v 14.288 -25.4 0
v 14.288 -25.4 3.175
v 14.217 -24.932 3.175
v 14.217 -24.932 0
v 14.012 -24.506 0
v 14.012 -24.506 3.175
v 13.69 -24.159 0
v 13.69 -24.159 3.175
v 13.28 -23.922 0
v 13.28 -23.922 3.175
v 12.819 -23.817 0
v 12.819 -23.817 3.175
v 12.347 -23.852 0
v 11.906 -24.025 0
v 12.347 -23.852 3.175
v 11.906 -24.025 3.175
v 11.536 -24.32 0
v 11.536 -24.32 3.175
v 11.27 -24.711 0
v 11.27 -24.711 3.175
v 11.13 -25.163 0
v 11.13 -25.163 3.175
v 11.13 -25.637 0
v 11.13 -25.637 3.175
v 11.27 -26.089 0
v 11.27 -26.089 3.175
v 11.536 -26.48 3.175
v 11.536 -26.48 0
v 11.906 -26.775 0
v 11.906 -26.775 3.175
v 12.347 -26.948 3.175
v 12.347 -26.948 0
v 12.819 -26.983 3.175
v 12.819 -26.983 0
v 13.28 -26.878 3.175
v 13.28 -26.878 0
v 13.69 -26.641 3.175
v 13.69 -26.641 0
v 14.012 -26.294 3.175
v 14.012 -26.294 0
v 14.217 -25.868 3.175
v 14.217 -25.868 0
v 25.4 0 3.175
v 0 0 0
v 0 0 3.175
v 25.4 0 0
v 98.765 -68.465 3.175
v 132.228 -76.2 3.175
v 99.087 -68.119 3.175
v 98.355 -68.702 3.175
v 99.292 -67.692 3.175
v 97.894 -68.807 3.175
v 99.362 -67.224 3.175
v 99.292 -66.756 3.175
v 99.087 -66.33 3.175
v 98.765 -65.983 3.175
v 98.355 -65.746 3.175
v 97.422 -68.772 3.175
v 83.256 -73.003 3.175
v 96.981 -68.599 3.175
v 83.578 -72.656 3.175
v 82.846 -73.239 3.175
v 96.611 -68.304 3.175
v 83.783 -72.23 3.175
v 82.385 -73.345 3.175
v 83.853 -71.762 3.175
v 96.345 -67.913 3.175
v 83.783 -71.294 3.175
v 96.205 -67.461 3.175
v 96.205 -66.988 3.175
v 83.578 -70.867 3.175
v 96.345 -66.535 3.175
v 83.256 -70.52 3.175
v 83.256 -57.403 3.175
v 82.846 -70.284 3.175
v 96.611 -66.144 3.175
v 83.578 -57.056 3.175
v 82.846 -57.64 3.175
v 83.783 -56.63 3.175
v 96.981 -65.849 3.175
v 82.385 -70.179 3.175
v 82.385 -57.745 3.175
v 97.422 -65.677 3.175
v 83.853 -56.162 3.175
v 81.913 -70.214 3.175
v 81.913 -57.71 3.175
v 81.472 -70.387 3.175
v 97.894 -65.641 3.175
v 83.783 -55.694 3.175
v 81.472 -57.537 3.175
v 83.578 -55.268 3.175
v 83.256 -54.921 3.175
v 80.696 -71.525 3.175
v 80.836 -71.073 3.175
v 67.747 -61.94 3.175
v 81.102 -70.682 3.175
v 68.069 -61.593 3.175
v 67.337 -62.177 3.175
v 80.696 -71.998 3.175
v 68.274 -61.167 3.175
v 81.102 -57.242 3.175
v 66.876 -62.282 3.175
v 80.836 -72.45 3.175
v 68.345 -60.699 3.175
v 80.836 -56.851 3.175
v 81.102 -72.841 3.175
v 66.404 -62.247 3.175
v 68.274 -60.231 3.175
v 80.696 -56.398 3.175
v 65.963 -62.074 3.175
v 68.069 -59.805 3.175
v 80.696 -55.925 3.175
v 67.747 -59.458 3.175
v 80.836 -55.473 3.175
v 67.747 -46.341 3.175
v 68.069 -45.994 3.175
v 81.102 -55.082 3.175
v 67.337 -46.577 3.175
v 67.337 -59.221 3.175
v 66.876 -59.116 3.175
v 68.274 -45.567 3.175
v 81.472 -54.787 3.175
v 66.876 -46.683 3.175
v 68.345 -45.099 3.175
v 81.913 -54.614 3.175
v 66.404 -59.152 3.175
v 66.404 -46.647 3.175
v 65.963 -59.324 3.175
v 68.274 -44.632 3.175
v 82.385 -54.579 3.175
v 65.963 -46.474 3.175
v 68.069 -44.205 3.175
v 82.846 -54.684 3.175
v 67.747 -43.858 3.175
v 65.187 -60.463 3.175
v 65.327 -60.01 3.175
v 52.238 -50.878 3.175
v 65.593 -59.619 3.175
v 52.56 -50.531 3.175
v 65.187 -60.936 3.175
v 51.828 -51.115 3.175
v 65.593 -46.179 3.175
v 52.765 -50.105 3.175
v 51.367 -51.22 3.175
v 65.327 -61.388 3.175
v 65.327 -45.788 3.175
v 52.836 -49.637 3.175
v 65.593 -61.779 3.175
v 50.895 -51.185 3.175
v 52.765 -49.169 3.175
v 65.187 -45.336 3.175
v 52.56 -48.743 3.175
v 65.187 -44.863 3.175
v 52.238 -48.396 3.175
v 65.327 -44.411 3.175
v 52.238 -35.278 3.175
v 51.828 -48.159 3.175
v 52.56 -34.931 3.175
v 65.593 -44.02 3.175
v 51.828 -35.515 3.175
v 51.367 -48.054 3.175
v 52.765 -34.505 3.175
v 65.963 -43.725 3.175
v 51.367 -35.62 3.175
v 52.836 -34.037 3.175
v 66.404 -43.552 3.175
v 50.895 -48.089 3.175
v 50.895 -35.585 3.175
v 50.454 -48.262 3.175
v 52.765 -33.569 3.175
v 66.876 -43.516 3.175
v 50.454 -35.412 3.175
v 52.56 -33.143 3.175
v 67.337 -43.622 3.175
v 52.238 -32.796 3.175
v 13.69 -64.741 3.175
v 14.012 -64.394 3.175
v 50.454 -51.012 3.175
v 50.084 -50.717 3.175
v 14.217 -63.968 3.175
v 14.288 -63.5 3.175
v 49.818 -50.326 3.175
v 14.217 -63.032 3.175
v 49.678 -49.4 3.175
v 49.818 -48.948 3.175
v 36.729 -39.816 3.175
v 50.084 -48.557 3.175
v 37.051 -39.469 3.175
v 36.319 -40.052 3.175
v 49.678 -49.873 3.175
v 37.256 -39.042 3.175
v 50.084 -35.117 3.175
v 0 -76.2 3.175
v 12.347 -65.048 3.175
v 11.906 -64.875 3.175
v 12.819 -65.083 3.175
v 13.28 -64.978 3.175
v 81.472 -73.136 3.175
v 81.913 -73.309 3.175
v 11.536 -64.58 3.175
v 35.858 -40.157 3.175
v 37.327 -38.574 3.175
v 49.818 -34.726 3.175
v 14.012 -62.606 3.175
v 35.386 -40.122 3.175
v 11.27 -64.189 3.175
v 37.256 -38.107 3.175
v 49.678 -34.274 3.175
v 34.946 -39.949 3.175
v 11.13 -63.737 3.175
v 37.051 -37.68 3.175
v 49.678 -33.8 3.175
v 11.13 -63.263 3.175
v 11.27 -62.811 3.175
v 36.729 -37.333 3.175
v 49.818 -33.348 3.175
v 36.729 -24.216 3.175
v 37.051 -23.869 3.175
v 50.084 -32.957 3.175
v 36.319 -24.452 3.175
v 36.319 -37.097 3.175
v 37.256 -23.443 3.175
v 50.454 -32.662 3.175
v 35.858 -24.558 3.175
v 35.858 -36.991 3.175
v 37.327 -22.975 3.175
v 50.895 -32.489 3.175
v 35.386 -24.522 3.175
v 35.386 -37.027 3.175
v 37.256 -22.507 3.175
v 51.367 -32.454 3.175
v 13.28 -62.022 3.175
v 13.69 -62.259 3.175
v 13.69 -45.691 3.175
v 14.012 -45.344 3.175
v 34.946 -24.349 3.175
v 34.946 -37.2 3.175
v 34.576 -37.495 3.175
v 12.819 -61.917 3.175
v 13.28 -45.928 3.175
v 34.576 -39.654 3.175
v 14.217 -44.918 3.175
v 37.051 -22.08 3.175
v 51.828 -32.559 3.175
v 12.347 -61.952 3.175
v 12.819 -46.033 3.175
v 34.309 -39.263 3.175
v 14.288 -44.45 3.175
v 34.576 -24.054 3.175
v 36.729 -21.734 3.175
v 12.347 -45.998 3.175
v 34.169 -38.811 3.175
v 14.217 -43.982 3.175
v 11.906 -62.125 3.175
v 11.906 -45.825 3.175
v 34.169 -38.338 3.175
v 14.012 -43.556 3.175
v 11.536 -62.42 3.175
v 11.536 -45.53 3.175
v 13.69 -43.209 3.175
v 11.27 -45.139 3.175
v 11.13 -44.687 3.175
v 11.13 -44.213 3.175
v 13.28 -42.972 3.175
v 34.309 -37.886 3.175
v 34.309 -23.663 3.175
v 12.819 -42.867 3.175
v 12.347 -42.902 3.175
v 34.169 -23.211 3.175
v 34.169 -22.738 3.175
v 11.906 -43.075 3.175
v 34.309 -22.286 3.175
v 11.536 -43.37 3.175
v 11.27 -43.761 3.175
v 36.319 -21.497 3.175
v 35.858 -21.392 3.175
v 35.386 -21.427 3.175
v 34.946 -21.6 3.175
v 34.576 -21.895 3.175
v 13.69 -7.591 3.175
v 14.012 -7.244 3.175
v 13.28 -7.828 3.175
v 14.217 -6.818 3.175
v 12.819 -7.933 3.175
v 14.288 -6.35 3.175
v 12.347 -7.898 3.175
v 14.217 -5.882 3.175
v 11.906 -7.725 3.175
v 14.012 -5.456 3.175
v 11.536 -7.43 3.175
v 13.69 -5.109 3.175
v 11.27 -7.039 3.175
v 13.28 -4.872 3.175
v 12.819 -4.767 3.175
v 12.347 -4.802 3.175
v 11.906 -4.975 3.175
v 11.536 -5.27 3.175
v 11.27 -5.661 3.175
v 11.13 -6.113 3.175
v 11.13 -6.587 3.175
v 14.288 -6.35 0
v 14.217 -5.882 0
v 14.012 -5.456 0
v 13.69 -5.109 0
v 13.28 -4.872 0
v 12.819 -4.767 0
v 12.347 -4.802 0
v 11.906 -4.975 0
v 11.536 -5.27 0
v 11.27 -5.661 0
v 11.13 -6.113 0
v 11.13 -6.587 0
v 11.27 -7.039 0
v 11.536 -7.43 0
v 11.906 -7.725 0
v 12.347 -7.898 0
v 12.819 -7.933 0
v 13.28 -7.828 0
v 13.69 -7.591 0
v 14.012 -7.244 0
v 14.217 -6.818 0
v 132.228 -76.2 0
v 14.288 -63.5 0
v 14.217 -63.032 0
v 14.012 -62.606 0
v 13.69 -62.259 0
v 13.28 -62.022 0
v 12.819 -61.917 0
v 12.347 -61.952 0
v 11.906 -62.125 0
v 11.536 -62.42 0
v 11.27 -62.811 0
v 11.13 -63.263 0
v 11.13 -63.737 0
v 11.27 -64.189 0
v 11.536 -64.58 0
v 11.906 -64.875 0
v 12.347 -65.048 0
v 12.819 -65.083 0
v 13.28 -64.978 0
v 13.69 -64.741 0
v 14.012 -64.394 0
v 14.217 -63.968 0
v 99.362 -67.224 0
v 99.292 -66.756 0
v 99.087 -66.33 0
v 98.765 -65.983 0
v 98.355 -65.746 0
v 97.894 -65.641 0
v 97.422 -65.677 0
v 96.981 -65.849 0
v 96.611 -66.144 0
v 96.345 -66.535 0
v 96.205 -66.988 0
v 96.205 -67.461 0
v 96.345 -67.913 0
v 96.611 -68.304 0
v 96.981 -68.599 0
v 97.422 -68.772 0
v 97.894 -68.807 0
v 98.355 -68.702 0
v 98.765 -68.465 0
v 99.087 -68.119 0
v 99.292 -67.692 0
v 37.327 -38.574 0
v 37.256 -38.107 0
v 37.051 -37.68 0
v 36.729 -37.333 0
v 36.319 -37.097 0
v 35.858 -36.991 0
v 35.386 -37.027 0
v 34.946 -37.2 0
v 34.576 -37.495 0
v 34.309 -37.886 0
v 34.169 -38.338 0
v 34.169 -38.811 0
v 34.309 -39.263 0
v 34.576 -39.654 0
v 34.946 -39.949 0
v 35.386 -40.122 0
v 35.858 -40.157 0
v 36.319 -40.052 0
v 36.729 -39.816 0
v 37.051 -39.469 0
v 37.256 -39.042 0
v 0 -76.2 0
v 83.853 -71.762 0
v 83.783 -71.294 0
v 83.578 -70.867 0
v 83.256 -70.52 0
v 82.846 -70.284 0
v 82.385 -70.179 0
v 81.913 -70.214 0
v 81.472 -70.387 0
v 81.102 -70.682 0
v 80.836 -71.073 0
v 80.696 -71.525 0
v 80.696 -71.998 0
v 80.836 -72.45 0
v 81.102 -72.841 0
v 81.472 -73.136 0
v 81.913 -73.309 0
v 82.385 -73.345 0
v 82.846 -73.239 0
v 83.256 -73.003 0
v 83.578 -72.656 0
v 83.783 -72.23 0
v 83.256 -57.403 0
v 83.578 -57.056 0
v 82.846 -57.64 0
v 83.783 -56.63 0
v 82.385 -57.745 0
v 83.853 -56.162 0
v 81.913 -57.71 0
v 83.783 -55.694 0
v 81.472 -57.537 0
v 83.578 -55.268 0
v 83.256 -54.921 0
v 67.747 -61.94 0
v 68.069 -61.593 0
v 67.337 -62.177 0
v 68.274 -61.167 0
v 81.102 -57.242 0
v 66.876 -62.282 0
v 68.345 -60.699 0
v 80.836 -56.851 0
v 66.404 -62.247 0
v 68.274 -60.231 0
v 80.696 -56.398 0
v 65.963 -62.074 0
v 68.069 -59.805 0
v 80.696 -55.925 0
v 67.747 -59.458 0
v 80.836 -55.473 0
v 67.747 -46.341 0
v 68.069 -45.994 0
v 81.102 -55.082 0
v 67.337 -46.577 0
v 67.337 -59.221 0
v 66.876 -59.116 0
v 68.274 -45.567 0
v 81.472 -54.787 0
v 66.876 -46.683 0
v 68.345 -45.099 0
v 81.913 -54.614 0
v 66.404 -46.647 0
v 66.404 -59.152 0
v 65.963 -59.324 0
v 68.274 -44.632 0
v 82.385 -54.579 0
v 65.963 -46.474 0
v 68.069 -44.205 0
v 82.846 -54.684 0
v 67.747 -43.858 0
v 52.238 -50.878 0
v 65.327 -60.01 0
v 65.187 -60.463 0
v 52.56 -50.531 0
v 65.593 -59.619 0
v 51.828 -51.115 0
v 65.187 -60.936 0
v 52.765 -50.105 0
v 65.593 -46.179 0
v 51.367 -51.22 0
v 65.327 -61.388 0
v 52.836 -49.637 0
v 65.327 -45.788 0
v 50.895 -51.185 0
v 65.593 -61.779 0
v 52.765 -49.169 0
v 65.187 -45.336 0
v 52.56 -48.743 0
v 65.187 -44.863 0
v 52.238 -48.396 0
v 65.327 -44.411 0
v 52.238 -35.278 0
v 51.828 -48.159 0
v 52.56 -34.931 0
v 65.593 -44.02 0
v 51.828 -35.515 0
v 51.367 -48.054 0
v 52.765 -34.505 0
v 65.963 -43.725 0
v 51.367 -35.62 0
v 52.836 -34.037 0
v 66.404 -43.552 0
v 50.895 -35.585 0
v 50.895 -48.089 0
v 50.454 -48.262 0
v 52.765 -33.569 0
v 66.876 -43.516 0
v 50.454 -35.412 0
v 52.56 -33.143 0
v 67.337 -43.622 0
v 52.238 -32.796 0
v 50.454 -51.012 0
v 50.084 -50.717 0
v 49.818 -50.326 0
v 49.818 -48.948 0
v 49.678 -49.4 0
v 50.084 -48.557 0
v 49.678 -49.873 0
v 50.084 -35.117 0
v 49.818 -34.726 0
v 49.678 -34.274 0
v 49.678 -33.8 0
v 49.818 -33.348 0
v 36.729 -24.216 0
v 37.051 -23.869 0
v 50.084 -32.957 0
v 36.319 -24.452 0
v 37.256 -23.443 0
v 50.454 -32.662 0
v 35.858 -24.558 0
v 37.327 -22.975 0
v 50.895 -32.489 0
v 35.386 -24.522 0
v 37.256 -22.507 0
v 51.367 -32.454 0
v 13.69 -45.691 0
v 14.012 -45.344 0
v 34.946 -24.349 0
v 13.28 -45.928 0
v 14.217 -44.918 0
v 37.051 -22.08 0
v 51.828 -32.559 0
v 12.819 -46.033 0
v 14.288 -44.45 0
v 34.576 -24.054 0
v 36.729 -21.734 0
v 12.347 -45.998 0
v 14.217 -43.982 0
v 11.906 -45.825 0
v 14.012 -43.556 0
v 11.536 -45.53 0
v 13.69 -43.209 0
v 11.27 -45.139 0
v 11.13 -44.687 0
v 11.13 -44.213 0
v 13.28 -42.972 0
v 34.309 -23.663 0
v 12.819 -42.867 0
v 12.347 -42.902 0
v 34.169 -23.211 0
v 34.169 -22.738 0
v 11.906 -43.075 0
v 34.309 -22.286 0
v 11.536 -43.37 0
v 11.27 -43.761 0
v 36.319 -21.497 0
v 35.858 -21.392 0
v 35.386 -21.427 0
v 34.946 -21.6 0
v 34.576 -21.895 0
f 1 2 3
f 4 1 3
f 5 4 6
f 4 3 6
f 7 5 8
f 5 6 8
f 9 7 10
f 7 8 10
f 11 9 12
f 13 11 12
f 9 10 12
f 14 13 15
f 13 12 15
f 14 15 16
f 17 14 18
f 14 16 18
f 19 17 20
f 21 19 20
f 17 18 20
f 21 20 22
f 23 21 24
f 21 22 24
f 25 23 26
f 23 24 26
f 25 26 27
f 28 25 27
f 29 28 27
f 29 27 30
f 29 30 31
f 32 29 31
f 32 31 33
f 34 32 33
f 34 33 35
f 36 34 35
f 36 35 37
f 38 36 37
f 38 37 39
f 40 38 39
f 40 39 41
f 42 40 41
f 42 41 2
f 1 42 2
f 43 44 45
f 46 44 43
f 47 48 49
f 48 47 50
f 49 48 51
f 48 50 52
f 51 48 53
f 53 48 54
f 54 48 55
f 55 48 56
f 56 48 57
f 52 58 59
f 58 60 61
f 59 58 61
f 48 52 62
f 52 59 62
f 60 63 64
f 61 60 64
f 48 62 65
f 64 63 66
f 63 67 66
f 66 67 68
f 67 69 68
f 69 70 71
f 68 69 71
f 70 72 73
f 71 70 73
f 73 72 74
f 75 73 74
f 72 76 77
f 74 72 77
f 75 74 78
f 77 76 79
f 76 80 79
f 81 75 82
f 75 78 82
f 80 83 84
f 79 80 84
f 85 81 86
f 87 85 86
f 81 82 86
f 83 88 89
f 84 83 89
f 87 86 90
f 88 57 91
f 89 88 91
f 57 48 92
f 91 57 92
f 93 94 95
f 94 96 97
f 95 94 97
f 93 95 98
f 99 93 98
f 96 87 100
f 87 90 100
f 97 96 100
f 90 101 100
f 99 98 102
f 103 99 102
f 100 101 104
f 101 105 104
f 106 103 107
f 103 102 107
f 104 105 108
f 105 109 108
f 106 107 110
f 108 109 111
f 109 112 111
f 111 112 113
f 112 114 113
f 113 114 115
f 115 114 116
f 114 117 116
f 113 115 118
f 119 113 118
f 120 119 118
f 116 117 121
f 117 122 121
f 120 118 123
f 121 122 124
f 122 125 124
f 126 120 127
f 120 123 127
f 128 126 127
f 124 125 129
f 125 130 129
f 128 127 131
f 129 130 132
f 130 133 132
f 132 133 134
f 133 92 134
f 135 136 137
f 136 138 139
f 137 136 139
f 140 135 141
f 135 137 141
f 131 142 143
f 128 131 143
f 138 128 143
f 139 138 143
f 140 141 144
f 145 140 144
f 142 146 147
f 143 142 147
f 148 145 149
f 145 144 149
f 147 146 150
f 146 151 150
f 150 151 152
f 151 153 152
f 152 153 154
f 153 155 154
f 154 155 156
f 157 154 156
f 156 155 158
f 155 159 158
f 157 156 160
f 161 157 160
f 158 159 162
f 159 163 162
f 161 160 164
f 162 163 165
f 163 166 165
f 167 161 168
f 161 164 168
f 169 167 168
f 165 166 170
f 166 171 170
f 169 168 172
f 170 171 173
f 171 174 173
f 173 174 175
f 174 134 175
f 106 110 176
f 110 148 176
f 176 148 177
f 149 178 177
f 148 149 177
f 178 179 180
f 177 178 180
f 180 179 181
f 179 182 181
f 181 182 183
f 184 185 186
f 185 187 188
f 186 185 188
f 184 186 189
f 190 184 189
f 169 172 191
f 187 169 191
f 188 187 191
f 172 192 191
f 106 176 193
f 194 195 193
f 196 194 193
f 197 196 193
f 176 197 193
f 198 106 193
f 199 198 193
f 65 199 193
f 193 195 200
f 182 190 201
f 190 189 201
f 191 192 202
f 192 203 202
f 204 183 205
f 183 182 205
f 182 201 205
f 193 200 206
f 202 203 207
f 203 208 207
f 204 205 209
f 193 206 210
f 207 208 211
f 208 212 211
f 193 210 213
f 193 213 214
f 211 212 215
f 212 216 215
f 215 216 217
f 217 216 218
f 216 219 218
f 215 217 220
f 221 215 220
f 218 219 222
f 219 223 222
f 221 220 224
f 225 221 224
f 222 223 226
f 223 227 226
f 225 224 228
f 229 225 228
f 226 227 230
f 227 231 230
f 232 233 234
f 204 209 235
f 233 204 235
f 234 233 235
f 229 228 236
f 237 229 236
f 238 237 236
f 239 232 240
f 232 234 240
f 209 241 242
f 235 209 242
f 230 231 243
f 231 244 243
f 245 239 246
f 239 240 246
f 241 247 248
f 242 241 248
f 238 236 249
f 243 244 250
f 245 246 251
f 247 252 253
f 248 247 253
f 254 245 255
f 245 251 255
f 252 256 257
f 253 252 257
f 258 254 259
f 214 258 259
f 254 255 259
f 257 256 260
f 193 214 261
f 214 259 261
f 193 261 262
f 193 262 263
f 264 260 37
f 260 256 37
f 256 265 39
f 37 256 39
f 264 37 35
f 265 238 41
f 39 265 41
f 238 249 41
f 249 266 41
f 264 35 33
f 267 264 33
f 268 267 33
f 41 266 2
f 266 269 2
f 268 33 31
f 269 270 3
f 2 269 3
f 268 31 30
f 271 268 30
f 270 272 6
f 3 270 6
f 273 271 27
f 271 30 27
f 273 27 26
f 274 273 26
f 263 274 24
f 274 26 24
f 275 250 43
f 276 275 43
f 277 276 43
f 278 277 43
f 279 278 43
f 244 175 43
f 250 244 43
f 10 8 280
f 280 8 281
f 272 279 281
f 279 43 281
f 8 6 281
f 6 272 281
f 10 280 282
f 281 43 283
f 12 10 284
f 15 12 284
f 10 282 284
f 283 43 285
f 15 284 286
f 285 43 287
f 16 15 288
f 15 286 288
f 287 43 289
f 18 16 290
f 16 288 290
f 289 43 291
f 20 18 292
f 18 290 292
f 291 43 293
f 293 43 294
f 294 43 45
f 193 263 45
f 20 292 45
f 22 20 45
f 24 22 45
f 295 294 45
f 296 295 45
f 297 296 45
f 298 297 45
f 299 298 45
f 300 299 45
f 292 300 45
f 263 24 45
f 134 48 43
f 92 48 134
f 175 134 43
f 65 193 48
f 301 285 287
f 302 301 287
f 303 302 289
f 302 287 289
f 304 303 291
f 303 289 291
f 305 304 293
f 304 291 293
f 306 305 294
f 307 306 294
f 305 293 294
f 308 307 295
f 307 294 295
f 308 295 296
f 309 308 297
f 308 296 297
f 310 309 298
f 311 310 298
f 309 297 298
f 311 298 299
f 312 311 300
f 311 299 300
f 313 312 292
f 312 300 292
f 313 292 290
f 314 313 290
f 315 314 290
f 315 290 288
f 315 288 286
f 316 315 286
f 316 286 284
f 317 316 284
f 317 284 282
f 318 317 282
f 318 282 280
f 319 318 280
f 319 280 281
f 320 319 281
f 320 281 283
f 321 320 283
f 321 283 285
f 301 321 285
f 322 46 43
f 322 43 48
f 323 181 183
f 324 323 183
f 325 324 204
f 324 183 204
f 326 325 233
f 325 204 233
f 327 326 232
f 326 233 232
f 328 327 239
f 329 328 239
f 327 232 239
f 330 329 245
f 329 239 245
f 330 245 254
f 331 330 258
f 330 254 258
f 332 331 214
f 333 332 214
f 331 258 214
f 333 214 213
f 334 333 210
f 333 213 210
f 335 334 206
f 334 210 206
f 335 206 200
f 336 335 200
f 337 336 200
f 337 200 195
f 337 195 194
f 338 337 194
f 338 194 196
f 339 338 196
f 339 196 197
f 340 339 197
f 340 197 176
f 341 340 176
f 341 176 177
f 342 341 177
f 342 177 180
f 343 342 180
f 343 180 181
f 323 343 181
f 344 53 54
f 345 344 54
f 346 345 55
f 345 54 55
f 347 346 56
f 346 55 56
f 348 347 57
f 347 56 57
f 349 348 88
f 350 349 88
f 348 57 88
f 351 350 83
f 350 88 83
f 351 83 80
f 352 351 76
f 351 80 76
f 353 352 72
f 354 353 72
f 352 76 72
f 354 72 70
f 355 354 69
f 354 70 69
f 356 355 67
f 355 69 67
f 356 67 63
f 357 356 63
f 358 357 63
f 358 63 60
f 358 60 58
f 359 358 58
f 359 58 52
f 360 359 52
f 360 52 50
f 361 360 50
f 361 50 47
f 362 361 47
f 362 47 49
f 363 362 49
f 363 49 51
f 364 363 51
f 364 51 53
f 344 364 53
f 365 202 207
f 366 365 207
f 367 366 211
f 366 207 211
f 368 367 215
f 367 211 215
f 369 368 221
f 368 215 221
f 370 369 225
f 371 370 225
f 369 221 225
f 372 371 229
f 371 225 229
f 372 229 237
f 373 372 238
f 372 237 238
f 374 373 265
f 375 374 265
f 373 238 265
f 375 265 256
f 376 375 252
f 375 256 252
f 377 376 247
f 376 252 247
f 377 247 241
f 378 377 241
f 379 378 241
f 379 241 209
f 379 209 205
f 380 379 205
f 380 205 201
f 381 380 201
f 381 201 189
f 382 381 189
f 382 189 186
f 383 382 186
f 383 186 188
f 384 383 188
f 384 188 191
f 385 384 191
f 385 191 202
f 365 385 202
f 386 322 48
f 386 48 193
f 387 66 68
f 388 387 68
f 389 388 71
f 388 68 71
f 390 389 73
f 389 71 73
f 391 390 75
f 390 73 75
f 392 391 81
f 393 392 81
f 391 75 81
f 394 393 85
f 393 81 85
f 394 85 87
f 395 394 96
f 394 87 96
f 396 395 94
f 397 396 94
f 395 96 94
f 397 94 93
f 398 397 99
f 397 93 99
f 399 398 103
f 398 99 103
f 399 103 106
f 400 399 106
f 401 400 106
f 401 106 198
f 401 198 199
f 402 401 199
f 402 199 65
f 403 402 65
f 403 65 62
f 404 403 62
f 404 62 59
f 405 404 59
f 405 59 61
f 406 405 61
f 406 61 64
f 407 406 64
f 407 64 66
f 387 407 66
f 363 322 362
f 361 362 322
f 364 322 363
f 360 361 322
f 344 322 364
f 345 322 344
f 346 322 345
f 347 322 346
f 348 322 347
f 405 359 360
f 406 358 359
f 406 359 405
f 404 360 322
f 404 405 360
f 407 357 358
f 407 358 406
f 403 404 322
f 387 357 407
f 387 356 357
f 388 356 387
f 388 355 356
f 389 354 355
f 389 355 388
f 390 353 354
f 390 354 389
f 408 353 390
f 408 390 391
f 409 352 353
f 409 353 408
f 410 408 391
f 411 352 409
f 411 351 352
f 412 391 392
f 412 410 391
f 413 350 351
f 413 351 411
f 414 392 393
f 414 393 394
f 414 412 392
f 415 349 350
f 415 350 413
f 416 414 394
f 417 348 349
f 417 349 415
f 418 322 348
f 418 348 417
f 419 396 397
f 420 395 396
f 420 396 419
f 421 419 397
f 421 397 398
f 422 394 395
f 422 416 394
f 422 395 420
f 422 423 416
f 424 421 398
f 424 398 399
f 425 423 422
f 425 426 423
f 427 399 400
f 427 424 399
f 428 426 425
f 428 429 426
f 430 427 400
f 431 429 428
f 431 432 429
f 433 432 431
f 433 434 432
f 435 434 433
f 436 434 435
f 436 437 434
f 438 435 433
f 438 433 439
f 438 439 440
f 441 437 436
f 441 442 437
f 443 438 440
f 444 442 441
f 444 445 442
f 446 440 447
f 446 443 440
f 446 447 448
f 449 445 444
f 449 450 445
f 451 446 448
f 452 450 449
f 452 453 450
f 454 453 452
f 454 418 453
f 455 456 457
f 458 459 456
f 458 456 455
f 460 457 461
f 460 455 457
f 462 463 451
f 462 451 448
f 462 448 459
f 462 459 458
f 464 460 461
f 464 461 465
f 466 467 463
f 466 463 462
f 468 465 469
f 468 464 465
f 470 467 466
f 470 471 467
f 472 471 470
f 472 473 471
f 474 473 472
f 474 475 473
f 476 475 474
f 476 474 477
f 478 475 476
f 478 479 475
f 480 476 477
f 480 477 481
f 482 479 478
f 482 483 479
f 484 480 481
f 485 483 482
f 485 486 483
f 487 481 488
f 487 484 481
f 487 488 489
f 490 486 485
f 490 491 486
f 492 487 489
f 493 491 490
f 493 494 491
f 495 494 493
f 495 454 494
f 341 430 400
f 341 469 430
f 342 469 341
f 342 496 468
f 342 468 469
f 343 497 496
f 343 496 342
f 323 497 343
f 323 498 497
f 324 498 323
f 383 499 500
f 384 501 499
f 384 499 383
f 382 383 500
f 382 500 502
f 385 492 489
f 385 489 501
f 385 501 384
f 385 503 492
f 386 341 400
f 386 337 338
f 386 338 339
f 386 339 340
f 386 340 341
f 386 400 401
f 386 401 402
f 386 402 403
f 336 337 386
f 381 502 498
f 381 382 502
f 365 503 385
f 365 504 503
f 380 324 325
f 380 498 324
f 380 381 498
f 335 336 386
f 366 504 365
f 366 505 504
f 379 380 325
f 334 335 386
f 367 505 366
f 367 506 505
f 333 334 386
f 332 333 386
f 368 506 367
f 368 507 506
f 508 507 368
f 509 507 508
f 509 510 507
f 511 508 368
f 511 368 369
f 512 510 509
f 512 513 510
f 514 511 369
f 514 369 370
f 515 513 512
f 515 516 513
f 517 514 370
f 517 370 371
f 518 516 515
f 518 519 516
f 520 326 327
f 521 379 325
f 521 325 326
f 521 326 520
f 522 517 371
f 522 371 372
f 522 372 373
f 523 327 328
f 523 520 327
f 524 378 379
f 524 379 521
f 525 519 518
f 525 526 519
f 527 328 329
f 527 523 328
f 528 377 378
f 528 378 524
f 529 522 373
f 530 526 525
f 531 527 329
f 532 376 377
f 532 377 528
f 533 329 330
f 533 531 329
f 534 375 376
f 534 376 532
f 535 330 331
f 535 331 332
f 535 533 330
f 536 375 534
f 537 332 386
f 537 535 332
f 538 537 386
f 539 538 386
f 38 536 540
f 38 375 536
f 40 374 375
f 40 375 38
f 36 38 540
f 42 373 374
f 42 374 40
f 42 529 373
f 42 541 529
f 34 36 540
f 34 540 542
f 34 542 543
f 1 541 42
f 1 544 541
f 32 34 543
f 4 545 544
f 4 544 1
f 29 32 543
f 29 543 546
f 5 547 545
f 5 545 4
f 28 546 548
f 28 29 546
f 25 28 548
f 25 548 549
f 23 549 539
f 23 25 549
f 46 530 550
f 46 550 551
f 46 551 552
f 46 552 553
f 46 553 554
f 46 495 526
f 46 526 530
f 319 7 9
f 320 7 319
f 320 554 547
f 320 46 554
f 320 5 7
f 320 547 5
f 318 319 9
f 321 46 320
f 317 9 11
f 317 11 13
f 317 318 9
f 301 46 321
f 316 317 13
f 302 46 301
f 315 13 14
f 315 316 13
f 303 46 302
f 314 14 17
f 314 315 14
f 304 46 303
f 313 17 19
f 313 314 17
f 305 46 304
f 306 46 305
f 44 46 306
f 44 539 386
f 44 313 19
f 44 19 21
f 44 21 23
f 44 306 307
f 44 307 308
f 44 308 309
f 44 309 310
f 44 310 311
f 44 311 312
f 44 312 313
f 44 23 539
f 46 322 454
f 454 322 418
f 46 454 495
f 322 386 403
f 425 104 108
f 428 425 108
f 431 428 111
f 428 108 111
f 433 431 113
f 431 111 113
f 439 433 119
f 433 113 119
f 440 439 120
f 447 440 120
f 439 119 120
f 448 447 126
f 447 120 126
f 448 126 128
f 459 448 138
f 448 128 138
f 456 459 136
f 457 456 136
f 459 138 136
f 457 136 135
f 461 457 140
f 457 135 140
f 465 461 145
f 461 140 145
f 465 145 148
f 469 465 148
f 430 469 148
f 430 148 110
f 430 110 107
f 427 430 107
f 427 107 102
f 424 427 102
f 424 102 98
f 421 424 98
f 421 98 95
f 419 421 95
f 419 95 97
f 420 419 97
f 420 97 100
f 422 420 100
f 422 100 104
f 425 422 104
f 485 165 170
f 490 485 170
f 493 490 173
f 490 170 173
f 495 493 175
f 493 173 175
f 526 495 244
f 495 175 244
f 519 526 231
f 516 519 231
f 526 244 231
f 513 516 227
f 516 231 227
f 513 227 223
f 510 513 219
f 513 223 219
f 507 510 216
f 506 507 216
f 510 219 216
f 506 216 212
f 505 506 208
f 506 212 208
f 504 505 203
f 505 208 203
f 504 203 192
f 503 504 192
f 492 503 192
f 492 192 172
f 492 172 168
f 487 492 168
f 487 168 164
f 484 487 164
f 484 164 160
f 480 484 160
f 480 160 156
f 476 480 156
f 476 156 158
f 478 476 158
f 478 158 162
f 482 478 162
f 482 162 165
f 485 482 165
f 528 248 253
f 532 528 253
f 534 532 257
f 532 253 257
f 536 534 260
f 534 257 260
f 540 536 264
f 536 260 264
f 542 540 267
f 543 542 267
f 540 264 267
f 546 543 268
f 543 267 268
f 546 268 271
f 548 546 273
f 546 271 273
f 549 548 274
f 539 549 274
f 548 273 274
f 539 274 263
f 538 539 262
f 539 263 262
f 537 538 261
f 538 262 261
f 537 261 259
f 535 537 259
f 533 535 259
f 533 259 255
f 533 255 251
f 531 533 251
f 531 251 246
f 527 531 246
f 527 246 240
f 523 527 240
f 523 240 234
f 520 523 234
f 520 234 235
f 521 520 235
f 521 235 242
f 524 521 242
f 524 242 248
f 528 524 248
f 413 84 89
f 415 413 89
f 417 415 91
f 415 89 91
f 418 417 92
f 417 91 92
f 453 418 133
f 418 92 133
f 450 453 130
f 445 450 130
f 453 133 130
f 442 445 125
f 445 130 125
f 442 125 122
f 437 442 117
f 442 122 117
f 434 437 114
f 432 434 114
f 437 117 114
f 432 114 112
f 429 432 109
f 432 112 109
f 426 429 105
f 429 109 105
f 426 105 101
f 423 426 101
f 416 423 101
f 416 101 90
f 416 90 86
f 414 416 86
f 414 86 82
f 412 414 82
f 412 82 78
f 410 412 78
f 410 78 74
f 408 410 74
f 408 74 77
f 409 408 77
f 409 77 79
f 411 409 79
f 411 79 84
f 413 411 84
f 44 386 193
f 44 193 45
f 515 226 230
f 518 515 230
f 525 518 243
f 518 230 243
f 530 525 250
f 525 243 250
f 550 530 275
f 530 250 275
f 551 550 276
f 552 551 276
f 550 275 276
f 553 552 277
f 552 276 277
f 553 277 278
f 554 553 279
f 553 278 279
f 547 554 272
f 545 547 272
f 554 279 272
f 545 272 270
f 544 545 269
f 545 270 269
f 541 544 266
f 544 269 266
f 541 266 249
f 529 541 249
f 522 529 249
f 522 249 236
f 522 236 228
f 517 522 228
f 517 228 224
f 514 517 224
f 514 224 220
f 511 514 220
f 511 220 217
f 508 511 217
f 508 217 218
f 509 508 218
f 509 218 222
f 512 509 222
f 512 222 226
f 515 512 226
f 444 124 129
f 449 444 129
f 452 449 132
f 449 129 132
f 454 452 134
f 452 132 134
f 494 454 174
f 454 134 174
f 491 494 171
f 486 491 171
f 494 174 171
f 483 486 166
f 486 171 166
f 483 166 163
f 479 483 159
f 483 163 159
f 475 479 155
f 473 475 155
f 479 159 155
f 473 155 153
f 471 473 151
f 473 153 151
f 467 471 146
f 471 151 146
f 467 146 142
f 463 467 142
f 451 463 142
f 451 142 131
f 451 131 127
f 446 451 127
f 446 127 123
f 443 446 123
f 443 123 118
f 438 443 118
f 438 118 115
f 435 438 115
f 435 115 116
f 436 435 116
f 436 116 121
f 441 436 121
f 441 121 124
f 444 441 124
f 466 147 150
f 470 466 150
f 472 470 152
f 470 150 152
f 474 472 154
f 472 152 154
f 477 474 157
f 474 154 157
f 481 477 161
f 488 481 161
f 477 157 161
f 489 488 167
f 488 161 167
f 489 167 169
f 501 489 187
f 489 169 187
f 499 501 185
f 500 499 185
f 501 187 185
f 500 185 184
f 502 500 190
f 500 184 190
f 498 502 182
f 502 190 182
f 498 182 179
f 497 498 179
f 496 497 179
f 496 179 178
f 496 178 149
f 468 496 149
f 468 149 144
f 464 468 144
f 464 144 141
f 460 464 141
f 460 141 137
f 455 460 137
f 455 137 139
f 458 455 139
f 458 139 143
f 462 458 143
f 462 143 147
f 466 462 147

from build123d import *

# Parameters (mm, degrees)
BOSS_EXTRUDE1_DEPTH = 3.175
CUT_EXTRUDE1_REACH  = 154.646
SKETCH2_R           = 1.5875


with BuildPart() as part:
    # Sketch1 → Boss-Extrude1 (new body)
    with BuildSketch(Plane.XY):
        Polygon((0, 0), (25.4, 0), (132.228460039, -76.2), (0, -76.2), align=None)
    extrude(amount=BOSS_EXTRUDE1_DEPTH)

    # Sketch2 → Cut-Extrude1 (cut, up to next)
    with BuildSketch(Plane.XY.offset(3.175), mode=Mode.PRIVATE) as cut_extrude1_sk1:
        with Locations((12.7, -6.35)):
            Circle(SKETCH2_R)
    cut_extrude1_tool1 = extrude(cut_extrude1_sk1.sketch, amount=-CUT_EXTRUDE1_REACH, mode=Mode.PRIVATE) & part.part
    # Sketch2 → Cut-Extrude1 (cut, up to next)
    with BuildSketch(Plane.XY.offset(3.175), mode=Mode.PRIVATE) as cut_extrude1_sk2:
        with Locations((12.7, -25.4)):
            Circle(SKETCH2_R)
    cut_extrude1_tool2 = extrude(cut_extrude1_sk2.sketch, amount=-CUT_EXTRUDE1_REACH, mode=Mode.PRIVATE) & part.part
    # Sketch2 → Cut-Extrude1 (cut, up to next)
    with BuildSketch(Plane.XY.offset(3.175), mode=Mode.PRIVATE) as cut_extrude1_sk3:
        with Locations((12.7, -44.45)):
            Circle(SKETCH2_R)
    cut_extrude1_tool3 = extrude(cut_extrude1_sk3.sketch, amount=-CUT_EXTRUDE1_REACH, mode=Mode.PRIVATE) & part.part
    # Sketch2 → Cut-Extrude1 (cut, up to next)
    with BuildSketch(Plane.XY.offset(3.175), mode=Mode.PRIVATE) as cut_extrude1_sk4:
        with Locations((12.7, -63.5)):
            Circle(SKETCH2_R)
    cut_extrude1_tool4 = extrude(cut_extrude1_sk4.sketch, amount=-CUT_EXTRUDE1_REACH, mode=Mode.PRIVATE) & part.part
    # Sketch2 → Cut-Extrude1 (cut, up to next)
    with BuildSketch(Plane.XY.offset(3.175), mode=Mode.PRIVATE) as cut_extrude1_sk5:
        with Locations((35.739267083, -22.974679309)):
            Circle(SKETCH2_R)
    cut_extrude1_tool5 = extrude(cut_extrude1_sk5.sketch, amount=-CUT_EXTRUDE1_REACH, mode=Mode.PRIVATE) & part.part
    # Sketch2 → Cut-Extrude1 (cut, up to next)
    with BuildSketch(Plane.XY.offset(3.175), mode=Mode.PRIVATE) as cut_extrude1_sk6:
        with Locations((51.248167708, -34.037070616)):
            Circle(SKETCH2_R)
    cut_extrude1_tool6 = extrude(cut_extrude1_sk6.sketch, amount=-CUT_EXTRUDE1_REACH, mode=Mode.PRIVATE) & part.part
    # Sketch2 → Cut-Extrude1 (cut, up to next)
    with BuildSketch(Plane.XY.offset(3.175), mode=Mode.PRIVATE) as cut_extrude1_sk7:
        with Locations((66.757068333, -45.099461922)):
            Circle(SKETCH2_R)
    cut_extrude1_tool7 = extrude(cut_extrude1_sk7.sketch, amount=-CUT_EXTRUDE1_REACH, mode=Mode.PRIVATE) & part.part
    # Sketch2 → Cut-Extrude1 (cut, up to next)
    with BuildSketch(Plane.XY.offset(3.175), mode=Mode.PRIVATE) as cut_extrude1_sk8:
        with Locations((82.265968957, -56.161853228)):
            Circle(SKETCH2_R)
    cut_extrude1_tool8 = extrude(cut_extrude1_sk8.sketch, amount=-CUT_EXTRUDE1_REACH, mode=Mode.PRIVATE) & part.part
    # Sketch2 → Cut-Extrude1 (cut, up to next)
    with BuildSketch(Plane.XY.offset(3.175), mode=Mode.PRIVATE) as cut_extrude1_sk9:
        with Locations((97.774869582, -67.224244535)):
            Circle(SKETCH2_R)
    cut_extrude1_tool9 = extrude(cut_extrude1_sk9.sketch, amount=-CUT_EXTRUDE1_REACH, mode=Mode.PRIVATE) & part.part
    # Sketch2 → Cut-Extrude1 (cut, up to next)
    with BuildSketch(Plane.XY.offset(3.175), mode=Mode.PRIVATE) as cut_extrude1_sk10:
        with Locations((35.739267083, -38.574431081)):
            Circle(SKETCH2_R)
    cut_extrude1_tool10 = extrude(cut_extrude1_sk10.sketch, amount=-CUT_EXTRUDE1_REACH, mode=Mode.PRIVATE) & part.part
    # Sketch2 → Cut-Extrude1 (cut, up to next)
    with BuildSketch(Plane.XY.offset(3.175), mode=Mode.PRIVATE) as cut_extrude1_sk11:
        with Locations((51.248167708, -49.636822388)):
            Circle(SKETCH2_R)
    cut_extrude1_tool11 = extrude(cut_extrude1_sk11.sketch, amount=-CUT_EXTRUDE1_REACH, mode=Mode.PRIVATE) & part.part
    # Sketch2 → Cut-Extrude1 (cut, up to next)
    with BuildSketch(Plane.XY.offset(3.175), mode=Mode.PRIVATE) as cut_extrude1_sk12:
        with Locations((66.757068333, -60.699213694)):
            Circle(SKETCH2_R)
    cut_extrude1_tool12 = extrude(cut_extrude1_sk12.sketch, amount=-CUT_EXTRUDE1_REACH, mode=Mode.PRIVATE) & part.part
    # Sketch2 → Cut-Extrude1 (cut, up to next)
    with BuildSketch(Plane.XY.offset(3.175), mode=Mode.PRIVATE) as cut_extrude1_sk13:
        with Locations((82.265968957, -71.761605)):
            Circle(SKETCH2_R)
    cut_extrude1_tool13 = extrude(cut_extrude1_sk13.sketch, amount=-CUT_EXTRUDE1_REACH, mode=Mode.PRIVATE) & part.part
    add(cut_extrude1_tool1.solids().sort_by_distance((12.7, -6.35, 3.175))[0], mode=Mode.SUBTRACT)
    add(cut_extrude1_tool2.solids().sort_by_distance((12.7, -25.4, 3.175))[0], mode=Mode.SUBTRACT)
    add(cut_extrude1_tool3.solids().sort_by_distance((12.7, -44.45, 3.175))[0], mode=Mode.SUBTRACT)
    add(cut_extrude1_tool4.solids().sort_by_distance((12.7, -63.5, 3.175))[0], mode=Mode.SUBTRACT)
    add(cut_extrude1_tool5.solids().sort_by_distance((35.739267, -22.974679, 3.175))[0], mode=Mode.SUBTRACT)
    add(cut_extrude1_tool6.solids().sort_by_distance((51.248168, -34.037071, 3.175))[0], mode=Mode.SUBTRACT)
    add(cut_extrude1_tool7.solids().sort_by_distance((66.757068, -45.099462, 3.175))[0], mode=Mode.SUBTRACT)
    add(cut_extrude1_tool8.solids().sort_by_distance((82.265969, -56.161853, 3.175))[0], mode=Mode.SUBTRACT)
    add(cut_extrude1_tool9.solids().sort_by_distance((97.77487, -67.224245, 3.175))[0], mode=Mode.SUBTRACT)
    add(cut_extrude1_tool10.solids().sort_by_distance((35.739267, -38.574431, 3.175))[0], mode=Mode.SUBTRACT)
    add(cut_extrude1_tool11.solids().sort_by_distance((51.248168, -49.636822, 3.175))[0], mode=Mode.SUBTRACT)
    add(cut_extrude1_tool12.solids().sort_by_distance((66.757068, -60.699214, 3.175))[0], mode=Mode.SUBTRACT)
    add(cut_extrude1_tool13.solids().sort_by_distance((82.265969, -71.761605, 3.175))[0], mode=Mode.SUBTRACT)


solid = part.part
